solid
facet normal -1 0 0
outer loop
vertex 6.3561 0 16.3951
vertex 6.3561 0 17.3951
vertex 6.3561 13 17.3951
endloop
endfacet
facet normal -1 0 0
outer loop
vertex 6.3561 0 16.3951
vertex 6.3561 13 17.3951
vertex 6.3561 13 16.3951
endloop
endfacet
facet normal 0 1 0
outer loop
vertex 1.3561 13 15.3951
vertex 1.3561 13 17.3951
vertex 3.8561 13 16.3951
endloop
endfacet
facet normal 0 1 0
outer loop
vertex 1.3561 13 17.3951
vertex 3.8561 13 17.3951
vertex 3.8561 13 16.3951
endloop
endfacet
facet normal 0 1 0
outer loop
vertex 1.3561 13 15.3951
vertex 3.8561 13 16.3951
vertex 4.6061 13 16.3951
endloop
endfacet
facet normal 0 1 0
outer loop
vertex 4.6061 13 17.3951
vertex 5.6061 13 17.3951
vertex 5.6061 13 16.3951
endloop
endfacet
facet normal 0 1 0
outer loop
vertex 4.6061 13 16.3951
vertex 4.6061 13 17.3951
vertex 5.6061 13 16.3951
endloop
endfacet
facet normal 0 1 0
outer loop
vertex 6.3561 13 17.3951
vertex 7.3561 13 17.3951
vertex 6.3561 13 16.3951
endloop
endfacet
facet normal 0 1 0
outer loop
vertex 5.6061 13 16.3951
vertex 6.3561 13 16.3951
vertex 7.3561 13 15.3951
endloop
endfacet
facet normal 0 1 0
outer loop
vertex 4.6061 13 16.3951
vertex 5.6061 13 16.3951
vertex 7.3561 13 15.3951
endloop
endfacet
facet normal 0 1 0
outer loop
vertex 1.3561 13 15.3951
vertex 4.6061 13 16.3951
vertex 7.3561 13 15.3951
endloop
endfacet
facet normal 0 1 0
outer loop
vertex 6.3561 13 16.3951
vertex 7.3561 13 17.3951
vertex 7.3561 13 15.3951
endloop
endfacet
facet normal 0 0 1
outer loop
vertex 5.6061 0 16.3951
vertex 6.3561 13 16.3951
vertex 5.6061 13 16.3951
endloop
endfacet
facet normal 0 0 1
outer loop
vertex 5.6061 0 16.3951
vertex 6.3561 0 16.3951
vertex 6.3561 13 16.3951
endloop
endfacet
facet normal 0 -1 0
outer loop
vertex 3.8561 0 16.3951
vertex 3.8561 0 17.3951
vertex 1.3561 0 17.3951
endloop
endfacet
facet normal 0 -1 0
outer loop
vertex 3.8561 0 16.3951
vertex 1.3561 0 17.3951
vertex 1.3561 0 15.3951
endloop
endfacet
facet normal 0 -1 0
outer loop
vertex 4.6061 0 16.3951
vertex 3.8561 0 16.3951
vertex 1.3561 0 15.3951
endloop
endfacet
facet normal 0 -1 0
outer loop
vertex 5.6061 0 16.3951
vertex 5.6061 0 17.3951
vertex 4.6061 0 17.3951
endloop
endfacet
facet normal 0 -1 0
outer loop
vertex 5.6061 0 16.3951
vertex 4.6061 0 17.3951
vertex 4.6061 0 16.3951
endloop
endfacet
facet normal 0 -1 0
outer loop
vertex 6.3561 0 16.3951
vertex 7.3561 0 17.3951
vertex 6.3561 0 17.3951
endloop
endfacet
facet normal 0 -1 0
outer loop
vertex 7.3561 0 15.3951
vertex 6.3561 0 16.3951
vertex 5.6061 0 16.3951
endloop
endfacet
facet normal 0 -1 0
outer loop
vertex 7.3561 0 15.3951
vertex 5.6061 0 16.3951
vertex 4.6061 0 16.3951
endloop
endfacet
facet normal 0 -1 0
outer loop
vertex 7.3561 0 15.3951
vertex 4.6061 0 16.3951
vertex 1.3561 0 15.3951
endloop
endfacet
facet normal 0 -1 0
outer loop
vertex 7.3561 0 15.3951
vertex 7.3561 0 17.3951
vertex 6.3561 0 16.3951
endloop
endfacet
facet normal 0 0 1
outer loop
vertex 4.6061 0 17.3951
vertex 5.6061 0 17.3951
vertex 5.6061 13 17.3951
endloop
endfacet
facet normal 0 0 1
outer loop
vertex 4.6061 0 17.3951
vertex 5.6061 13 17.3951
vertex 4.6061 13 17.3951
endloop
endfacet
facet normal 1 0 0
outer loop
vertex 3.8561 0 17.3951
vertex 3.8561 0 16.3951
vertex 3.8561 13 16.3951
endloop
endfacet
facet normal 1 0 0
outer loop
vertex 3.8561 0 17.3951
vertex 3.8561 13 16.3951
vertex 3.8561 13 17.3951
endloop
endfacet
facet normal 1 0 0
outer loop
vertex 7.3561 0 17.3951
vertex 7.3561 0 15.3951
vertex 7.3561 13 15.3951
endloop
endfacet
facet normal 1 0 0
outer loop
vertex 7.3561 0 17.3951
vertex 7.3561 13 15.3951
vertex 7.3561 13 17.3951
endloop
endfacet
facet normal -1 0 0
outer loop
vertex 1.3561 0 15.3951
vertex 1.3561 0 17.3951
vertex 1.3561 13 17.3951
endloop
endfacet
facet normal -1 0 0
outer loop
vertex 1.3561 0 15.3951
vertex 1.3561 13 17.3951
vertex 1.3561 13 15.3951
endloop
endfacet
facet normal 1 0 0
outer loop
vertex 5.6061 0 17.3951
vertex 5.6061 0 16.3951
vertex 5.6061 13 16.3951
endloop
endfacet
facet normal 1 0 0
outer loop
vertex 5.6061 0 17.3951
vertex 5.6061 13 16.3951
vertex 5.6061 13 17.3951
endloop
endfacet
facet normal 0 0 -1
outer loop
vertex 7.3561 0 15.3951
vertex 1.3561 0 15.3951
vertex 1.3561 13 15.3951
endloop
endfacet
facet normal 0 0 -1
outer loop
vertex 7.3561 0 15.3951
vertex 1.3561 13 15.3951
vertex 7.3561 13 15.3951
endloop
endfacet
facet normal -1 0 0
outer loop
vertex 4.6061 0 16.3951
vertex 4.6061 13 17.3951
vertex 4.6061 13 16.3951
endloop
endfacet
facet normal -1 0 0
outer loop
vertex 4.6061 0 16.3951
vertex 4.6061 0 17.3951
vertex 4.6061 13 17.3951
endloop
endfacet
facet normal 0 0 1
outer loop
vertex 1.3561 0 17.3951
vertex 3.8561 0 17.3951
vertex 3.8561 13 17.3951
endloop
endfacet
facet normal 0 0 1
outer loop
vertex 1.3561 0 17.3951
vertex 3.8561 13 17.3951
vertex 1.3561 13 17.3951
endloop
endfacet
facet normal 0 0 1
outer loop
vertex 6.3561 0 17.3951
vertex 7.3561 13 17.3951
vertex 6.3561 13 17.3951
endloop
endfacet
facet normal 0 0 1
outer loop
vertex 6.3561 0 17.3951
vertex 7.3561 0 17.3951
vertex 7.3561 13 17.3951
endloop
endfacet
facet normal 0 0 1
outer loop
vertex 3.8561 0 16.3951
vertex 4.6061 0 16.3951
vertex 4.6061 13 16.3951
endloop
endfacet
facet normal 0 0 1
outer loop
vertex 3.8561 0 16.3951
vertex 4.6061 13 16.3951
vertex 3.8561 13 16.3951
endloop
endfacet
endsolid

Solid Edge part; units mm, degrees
sketch "Sketch1" plane through (-29.1145, 0, 1.6522) normal (0, -1, 0) x (1, 0, 0)
  line L0 (30.4706, 13.7429) -> (36.4706, 13.7429)
  line L1 (30.4706, 15.7429) -> (30.4706, 13.7429)
  line L2 (32.9706, 15.7429) -> (30.4706, 15.7429)
  line L3 (32.9706, 14.7429) -> (32.9706, 15.7429)
  line L4 (33.7206, 14.7429) -> (32.9706, 14.7429)
  line L5 (33.7206, 15.7429) -> (33.7206, 14.7429)
  line L6 (34.7206, 15.7429) -> (33.7206, 15.7429)
  line L7 (34.7206, 14.7429) -> (34.7206, 15.7429)
  line L8 (35.4706, 14.7429) -> (34.7206, 14.7429)
  line L9 (35.4706, 15.7429) -> (35.4706, 14.7429)
  line L10 (36.4706, 15.7429) -> (35.4706, 15.7429)
  line L11 (36.4706, 13.7429) -> (36.4706, 15.7429)
extrude "Protrusion1" add sketch "Sketch1" against normal blind 13
properties material "Stainless Steel, 420"
